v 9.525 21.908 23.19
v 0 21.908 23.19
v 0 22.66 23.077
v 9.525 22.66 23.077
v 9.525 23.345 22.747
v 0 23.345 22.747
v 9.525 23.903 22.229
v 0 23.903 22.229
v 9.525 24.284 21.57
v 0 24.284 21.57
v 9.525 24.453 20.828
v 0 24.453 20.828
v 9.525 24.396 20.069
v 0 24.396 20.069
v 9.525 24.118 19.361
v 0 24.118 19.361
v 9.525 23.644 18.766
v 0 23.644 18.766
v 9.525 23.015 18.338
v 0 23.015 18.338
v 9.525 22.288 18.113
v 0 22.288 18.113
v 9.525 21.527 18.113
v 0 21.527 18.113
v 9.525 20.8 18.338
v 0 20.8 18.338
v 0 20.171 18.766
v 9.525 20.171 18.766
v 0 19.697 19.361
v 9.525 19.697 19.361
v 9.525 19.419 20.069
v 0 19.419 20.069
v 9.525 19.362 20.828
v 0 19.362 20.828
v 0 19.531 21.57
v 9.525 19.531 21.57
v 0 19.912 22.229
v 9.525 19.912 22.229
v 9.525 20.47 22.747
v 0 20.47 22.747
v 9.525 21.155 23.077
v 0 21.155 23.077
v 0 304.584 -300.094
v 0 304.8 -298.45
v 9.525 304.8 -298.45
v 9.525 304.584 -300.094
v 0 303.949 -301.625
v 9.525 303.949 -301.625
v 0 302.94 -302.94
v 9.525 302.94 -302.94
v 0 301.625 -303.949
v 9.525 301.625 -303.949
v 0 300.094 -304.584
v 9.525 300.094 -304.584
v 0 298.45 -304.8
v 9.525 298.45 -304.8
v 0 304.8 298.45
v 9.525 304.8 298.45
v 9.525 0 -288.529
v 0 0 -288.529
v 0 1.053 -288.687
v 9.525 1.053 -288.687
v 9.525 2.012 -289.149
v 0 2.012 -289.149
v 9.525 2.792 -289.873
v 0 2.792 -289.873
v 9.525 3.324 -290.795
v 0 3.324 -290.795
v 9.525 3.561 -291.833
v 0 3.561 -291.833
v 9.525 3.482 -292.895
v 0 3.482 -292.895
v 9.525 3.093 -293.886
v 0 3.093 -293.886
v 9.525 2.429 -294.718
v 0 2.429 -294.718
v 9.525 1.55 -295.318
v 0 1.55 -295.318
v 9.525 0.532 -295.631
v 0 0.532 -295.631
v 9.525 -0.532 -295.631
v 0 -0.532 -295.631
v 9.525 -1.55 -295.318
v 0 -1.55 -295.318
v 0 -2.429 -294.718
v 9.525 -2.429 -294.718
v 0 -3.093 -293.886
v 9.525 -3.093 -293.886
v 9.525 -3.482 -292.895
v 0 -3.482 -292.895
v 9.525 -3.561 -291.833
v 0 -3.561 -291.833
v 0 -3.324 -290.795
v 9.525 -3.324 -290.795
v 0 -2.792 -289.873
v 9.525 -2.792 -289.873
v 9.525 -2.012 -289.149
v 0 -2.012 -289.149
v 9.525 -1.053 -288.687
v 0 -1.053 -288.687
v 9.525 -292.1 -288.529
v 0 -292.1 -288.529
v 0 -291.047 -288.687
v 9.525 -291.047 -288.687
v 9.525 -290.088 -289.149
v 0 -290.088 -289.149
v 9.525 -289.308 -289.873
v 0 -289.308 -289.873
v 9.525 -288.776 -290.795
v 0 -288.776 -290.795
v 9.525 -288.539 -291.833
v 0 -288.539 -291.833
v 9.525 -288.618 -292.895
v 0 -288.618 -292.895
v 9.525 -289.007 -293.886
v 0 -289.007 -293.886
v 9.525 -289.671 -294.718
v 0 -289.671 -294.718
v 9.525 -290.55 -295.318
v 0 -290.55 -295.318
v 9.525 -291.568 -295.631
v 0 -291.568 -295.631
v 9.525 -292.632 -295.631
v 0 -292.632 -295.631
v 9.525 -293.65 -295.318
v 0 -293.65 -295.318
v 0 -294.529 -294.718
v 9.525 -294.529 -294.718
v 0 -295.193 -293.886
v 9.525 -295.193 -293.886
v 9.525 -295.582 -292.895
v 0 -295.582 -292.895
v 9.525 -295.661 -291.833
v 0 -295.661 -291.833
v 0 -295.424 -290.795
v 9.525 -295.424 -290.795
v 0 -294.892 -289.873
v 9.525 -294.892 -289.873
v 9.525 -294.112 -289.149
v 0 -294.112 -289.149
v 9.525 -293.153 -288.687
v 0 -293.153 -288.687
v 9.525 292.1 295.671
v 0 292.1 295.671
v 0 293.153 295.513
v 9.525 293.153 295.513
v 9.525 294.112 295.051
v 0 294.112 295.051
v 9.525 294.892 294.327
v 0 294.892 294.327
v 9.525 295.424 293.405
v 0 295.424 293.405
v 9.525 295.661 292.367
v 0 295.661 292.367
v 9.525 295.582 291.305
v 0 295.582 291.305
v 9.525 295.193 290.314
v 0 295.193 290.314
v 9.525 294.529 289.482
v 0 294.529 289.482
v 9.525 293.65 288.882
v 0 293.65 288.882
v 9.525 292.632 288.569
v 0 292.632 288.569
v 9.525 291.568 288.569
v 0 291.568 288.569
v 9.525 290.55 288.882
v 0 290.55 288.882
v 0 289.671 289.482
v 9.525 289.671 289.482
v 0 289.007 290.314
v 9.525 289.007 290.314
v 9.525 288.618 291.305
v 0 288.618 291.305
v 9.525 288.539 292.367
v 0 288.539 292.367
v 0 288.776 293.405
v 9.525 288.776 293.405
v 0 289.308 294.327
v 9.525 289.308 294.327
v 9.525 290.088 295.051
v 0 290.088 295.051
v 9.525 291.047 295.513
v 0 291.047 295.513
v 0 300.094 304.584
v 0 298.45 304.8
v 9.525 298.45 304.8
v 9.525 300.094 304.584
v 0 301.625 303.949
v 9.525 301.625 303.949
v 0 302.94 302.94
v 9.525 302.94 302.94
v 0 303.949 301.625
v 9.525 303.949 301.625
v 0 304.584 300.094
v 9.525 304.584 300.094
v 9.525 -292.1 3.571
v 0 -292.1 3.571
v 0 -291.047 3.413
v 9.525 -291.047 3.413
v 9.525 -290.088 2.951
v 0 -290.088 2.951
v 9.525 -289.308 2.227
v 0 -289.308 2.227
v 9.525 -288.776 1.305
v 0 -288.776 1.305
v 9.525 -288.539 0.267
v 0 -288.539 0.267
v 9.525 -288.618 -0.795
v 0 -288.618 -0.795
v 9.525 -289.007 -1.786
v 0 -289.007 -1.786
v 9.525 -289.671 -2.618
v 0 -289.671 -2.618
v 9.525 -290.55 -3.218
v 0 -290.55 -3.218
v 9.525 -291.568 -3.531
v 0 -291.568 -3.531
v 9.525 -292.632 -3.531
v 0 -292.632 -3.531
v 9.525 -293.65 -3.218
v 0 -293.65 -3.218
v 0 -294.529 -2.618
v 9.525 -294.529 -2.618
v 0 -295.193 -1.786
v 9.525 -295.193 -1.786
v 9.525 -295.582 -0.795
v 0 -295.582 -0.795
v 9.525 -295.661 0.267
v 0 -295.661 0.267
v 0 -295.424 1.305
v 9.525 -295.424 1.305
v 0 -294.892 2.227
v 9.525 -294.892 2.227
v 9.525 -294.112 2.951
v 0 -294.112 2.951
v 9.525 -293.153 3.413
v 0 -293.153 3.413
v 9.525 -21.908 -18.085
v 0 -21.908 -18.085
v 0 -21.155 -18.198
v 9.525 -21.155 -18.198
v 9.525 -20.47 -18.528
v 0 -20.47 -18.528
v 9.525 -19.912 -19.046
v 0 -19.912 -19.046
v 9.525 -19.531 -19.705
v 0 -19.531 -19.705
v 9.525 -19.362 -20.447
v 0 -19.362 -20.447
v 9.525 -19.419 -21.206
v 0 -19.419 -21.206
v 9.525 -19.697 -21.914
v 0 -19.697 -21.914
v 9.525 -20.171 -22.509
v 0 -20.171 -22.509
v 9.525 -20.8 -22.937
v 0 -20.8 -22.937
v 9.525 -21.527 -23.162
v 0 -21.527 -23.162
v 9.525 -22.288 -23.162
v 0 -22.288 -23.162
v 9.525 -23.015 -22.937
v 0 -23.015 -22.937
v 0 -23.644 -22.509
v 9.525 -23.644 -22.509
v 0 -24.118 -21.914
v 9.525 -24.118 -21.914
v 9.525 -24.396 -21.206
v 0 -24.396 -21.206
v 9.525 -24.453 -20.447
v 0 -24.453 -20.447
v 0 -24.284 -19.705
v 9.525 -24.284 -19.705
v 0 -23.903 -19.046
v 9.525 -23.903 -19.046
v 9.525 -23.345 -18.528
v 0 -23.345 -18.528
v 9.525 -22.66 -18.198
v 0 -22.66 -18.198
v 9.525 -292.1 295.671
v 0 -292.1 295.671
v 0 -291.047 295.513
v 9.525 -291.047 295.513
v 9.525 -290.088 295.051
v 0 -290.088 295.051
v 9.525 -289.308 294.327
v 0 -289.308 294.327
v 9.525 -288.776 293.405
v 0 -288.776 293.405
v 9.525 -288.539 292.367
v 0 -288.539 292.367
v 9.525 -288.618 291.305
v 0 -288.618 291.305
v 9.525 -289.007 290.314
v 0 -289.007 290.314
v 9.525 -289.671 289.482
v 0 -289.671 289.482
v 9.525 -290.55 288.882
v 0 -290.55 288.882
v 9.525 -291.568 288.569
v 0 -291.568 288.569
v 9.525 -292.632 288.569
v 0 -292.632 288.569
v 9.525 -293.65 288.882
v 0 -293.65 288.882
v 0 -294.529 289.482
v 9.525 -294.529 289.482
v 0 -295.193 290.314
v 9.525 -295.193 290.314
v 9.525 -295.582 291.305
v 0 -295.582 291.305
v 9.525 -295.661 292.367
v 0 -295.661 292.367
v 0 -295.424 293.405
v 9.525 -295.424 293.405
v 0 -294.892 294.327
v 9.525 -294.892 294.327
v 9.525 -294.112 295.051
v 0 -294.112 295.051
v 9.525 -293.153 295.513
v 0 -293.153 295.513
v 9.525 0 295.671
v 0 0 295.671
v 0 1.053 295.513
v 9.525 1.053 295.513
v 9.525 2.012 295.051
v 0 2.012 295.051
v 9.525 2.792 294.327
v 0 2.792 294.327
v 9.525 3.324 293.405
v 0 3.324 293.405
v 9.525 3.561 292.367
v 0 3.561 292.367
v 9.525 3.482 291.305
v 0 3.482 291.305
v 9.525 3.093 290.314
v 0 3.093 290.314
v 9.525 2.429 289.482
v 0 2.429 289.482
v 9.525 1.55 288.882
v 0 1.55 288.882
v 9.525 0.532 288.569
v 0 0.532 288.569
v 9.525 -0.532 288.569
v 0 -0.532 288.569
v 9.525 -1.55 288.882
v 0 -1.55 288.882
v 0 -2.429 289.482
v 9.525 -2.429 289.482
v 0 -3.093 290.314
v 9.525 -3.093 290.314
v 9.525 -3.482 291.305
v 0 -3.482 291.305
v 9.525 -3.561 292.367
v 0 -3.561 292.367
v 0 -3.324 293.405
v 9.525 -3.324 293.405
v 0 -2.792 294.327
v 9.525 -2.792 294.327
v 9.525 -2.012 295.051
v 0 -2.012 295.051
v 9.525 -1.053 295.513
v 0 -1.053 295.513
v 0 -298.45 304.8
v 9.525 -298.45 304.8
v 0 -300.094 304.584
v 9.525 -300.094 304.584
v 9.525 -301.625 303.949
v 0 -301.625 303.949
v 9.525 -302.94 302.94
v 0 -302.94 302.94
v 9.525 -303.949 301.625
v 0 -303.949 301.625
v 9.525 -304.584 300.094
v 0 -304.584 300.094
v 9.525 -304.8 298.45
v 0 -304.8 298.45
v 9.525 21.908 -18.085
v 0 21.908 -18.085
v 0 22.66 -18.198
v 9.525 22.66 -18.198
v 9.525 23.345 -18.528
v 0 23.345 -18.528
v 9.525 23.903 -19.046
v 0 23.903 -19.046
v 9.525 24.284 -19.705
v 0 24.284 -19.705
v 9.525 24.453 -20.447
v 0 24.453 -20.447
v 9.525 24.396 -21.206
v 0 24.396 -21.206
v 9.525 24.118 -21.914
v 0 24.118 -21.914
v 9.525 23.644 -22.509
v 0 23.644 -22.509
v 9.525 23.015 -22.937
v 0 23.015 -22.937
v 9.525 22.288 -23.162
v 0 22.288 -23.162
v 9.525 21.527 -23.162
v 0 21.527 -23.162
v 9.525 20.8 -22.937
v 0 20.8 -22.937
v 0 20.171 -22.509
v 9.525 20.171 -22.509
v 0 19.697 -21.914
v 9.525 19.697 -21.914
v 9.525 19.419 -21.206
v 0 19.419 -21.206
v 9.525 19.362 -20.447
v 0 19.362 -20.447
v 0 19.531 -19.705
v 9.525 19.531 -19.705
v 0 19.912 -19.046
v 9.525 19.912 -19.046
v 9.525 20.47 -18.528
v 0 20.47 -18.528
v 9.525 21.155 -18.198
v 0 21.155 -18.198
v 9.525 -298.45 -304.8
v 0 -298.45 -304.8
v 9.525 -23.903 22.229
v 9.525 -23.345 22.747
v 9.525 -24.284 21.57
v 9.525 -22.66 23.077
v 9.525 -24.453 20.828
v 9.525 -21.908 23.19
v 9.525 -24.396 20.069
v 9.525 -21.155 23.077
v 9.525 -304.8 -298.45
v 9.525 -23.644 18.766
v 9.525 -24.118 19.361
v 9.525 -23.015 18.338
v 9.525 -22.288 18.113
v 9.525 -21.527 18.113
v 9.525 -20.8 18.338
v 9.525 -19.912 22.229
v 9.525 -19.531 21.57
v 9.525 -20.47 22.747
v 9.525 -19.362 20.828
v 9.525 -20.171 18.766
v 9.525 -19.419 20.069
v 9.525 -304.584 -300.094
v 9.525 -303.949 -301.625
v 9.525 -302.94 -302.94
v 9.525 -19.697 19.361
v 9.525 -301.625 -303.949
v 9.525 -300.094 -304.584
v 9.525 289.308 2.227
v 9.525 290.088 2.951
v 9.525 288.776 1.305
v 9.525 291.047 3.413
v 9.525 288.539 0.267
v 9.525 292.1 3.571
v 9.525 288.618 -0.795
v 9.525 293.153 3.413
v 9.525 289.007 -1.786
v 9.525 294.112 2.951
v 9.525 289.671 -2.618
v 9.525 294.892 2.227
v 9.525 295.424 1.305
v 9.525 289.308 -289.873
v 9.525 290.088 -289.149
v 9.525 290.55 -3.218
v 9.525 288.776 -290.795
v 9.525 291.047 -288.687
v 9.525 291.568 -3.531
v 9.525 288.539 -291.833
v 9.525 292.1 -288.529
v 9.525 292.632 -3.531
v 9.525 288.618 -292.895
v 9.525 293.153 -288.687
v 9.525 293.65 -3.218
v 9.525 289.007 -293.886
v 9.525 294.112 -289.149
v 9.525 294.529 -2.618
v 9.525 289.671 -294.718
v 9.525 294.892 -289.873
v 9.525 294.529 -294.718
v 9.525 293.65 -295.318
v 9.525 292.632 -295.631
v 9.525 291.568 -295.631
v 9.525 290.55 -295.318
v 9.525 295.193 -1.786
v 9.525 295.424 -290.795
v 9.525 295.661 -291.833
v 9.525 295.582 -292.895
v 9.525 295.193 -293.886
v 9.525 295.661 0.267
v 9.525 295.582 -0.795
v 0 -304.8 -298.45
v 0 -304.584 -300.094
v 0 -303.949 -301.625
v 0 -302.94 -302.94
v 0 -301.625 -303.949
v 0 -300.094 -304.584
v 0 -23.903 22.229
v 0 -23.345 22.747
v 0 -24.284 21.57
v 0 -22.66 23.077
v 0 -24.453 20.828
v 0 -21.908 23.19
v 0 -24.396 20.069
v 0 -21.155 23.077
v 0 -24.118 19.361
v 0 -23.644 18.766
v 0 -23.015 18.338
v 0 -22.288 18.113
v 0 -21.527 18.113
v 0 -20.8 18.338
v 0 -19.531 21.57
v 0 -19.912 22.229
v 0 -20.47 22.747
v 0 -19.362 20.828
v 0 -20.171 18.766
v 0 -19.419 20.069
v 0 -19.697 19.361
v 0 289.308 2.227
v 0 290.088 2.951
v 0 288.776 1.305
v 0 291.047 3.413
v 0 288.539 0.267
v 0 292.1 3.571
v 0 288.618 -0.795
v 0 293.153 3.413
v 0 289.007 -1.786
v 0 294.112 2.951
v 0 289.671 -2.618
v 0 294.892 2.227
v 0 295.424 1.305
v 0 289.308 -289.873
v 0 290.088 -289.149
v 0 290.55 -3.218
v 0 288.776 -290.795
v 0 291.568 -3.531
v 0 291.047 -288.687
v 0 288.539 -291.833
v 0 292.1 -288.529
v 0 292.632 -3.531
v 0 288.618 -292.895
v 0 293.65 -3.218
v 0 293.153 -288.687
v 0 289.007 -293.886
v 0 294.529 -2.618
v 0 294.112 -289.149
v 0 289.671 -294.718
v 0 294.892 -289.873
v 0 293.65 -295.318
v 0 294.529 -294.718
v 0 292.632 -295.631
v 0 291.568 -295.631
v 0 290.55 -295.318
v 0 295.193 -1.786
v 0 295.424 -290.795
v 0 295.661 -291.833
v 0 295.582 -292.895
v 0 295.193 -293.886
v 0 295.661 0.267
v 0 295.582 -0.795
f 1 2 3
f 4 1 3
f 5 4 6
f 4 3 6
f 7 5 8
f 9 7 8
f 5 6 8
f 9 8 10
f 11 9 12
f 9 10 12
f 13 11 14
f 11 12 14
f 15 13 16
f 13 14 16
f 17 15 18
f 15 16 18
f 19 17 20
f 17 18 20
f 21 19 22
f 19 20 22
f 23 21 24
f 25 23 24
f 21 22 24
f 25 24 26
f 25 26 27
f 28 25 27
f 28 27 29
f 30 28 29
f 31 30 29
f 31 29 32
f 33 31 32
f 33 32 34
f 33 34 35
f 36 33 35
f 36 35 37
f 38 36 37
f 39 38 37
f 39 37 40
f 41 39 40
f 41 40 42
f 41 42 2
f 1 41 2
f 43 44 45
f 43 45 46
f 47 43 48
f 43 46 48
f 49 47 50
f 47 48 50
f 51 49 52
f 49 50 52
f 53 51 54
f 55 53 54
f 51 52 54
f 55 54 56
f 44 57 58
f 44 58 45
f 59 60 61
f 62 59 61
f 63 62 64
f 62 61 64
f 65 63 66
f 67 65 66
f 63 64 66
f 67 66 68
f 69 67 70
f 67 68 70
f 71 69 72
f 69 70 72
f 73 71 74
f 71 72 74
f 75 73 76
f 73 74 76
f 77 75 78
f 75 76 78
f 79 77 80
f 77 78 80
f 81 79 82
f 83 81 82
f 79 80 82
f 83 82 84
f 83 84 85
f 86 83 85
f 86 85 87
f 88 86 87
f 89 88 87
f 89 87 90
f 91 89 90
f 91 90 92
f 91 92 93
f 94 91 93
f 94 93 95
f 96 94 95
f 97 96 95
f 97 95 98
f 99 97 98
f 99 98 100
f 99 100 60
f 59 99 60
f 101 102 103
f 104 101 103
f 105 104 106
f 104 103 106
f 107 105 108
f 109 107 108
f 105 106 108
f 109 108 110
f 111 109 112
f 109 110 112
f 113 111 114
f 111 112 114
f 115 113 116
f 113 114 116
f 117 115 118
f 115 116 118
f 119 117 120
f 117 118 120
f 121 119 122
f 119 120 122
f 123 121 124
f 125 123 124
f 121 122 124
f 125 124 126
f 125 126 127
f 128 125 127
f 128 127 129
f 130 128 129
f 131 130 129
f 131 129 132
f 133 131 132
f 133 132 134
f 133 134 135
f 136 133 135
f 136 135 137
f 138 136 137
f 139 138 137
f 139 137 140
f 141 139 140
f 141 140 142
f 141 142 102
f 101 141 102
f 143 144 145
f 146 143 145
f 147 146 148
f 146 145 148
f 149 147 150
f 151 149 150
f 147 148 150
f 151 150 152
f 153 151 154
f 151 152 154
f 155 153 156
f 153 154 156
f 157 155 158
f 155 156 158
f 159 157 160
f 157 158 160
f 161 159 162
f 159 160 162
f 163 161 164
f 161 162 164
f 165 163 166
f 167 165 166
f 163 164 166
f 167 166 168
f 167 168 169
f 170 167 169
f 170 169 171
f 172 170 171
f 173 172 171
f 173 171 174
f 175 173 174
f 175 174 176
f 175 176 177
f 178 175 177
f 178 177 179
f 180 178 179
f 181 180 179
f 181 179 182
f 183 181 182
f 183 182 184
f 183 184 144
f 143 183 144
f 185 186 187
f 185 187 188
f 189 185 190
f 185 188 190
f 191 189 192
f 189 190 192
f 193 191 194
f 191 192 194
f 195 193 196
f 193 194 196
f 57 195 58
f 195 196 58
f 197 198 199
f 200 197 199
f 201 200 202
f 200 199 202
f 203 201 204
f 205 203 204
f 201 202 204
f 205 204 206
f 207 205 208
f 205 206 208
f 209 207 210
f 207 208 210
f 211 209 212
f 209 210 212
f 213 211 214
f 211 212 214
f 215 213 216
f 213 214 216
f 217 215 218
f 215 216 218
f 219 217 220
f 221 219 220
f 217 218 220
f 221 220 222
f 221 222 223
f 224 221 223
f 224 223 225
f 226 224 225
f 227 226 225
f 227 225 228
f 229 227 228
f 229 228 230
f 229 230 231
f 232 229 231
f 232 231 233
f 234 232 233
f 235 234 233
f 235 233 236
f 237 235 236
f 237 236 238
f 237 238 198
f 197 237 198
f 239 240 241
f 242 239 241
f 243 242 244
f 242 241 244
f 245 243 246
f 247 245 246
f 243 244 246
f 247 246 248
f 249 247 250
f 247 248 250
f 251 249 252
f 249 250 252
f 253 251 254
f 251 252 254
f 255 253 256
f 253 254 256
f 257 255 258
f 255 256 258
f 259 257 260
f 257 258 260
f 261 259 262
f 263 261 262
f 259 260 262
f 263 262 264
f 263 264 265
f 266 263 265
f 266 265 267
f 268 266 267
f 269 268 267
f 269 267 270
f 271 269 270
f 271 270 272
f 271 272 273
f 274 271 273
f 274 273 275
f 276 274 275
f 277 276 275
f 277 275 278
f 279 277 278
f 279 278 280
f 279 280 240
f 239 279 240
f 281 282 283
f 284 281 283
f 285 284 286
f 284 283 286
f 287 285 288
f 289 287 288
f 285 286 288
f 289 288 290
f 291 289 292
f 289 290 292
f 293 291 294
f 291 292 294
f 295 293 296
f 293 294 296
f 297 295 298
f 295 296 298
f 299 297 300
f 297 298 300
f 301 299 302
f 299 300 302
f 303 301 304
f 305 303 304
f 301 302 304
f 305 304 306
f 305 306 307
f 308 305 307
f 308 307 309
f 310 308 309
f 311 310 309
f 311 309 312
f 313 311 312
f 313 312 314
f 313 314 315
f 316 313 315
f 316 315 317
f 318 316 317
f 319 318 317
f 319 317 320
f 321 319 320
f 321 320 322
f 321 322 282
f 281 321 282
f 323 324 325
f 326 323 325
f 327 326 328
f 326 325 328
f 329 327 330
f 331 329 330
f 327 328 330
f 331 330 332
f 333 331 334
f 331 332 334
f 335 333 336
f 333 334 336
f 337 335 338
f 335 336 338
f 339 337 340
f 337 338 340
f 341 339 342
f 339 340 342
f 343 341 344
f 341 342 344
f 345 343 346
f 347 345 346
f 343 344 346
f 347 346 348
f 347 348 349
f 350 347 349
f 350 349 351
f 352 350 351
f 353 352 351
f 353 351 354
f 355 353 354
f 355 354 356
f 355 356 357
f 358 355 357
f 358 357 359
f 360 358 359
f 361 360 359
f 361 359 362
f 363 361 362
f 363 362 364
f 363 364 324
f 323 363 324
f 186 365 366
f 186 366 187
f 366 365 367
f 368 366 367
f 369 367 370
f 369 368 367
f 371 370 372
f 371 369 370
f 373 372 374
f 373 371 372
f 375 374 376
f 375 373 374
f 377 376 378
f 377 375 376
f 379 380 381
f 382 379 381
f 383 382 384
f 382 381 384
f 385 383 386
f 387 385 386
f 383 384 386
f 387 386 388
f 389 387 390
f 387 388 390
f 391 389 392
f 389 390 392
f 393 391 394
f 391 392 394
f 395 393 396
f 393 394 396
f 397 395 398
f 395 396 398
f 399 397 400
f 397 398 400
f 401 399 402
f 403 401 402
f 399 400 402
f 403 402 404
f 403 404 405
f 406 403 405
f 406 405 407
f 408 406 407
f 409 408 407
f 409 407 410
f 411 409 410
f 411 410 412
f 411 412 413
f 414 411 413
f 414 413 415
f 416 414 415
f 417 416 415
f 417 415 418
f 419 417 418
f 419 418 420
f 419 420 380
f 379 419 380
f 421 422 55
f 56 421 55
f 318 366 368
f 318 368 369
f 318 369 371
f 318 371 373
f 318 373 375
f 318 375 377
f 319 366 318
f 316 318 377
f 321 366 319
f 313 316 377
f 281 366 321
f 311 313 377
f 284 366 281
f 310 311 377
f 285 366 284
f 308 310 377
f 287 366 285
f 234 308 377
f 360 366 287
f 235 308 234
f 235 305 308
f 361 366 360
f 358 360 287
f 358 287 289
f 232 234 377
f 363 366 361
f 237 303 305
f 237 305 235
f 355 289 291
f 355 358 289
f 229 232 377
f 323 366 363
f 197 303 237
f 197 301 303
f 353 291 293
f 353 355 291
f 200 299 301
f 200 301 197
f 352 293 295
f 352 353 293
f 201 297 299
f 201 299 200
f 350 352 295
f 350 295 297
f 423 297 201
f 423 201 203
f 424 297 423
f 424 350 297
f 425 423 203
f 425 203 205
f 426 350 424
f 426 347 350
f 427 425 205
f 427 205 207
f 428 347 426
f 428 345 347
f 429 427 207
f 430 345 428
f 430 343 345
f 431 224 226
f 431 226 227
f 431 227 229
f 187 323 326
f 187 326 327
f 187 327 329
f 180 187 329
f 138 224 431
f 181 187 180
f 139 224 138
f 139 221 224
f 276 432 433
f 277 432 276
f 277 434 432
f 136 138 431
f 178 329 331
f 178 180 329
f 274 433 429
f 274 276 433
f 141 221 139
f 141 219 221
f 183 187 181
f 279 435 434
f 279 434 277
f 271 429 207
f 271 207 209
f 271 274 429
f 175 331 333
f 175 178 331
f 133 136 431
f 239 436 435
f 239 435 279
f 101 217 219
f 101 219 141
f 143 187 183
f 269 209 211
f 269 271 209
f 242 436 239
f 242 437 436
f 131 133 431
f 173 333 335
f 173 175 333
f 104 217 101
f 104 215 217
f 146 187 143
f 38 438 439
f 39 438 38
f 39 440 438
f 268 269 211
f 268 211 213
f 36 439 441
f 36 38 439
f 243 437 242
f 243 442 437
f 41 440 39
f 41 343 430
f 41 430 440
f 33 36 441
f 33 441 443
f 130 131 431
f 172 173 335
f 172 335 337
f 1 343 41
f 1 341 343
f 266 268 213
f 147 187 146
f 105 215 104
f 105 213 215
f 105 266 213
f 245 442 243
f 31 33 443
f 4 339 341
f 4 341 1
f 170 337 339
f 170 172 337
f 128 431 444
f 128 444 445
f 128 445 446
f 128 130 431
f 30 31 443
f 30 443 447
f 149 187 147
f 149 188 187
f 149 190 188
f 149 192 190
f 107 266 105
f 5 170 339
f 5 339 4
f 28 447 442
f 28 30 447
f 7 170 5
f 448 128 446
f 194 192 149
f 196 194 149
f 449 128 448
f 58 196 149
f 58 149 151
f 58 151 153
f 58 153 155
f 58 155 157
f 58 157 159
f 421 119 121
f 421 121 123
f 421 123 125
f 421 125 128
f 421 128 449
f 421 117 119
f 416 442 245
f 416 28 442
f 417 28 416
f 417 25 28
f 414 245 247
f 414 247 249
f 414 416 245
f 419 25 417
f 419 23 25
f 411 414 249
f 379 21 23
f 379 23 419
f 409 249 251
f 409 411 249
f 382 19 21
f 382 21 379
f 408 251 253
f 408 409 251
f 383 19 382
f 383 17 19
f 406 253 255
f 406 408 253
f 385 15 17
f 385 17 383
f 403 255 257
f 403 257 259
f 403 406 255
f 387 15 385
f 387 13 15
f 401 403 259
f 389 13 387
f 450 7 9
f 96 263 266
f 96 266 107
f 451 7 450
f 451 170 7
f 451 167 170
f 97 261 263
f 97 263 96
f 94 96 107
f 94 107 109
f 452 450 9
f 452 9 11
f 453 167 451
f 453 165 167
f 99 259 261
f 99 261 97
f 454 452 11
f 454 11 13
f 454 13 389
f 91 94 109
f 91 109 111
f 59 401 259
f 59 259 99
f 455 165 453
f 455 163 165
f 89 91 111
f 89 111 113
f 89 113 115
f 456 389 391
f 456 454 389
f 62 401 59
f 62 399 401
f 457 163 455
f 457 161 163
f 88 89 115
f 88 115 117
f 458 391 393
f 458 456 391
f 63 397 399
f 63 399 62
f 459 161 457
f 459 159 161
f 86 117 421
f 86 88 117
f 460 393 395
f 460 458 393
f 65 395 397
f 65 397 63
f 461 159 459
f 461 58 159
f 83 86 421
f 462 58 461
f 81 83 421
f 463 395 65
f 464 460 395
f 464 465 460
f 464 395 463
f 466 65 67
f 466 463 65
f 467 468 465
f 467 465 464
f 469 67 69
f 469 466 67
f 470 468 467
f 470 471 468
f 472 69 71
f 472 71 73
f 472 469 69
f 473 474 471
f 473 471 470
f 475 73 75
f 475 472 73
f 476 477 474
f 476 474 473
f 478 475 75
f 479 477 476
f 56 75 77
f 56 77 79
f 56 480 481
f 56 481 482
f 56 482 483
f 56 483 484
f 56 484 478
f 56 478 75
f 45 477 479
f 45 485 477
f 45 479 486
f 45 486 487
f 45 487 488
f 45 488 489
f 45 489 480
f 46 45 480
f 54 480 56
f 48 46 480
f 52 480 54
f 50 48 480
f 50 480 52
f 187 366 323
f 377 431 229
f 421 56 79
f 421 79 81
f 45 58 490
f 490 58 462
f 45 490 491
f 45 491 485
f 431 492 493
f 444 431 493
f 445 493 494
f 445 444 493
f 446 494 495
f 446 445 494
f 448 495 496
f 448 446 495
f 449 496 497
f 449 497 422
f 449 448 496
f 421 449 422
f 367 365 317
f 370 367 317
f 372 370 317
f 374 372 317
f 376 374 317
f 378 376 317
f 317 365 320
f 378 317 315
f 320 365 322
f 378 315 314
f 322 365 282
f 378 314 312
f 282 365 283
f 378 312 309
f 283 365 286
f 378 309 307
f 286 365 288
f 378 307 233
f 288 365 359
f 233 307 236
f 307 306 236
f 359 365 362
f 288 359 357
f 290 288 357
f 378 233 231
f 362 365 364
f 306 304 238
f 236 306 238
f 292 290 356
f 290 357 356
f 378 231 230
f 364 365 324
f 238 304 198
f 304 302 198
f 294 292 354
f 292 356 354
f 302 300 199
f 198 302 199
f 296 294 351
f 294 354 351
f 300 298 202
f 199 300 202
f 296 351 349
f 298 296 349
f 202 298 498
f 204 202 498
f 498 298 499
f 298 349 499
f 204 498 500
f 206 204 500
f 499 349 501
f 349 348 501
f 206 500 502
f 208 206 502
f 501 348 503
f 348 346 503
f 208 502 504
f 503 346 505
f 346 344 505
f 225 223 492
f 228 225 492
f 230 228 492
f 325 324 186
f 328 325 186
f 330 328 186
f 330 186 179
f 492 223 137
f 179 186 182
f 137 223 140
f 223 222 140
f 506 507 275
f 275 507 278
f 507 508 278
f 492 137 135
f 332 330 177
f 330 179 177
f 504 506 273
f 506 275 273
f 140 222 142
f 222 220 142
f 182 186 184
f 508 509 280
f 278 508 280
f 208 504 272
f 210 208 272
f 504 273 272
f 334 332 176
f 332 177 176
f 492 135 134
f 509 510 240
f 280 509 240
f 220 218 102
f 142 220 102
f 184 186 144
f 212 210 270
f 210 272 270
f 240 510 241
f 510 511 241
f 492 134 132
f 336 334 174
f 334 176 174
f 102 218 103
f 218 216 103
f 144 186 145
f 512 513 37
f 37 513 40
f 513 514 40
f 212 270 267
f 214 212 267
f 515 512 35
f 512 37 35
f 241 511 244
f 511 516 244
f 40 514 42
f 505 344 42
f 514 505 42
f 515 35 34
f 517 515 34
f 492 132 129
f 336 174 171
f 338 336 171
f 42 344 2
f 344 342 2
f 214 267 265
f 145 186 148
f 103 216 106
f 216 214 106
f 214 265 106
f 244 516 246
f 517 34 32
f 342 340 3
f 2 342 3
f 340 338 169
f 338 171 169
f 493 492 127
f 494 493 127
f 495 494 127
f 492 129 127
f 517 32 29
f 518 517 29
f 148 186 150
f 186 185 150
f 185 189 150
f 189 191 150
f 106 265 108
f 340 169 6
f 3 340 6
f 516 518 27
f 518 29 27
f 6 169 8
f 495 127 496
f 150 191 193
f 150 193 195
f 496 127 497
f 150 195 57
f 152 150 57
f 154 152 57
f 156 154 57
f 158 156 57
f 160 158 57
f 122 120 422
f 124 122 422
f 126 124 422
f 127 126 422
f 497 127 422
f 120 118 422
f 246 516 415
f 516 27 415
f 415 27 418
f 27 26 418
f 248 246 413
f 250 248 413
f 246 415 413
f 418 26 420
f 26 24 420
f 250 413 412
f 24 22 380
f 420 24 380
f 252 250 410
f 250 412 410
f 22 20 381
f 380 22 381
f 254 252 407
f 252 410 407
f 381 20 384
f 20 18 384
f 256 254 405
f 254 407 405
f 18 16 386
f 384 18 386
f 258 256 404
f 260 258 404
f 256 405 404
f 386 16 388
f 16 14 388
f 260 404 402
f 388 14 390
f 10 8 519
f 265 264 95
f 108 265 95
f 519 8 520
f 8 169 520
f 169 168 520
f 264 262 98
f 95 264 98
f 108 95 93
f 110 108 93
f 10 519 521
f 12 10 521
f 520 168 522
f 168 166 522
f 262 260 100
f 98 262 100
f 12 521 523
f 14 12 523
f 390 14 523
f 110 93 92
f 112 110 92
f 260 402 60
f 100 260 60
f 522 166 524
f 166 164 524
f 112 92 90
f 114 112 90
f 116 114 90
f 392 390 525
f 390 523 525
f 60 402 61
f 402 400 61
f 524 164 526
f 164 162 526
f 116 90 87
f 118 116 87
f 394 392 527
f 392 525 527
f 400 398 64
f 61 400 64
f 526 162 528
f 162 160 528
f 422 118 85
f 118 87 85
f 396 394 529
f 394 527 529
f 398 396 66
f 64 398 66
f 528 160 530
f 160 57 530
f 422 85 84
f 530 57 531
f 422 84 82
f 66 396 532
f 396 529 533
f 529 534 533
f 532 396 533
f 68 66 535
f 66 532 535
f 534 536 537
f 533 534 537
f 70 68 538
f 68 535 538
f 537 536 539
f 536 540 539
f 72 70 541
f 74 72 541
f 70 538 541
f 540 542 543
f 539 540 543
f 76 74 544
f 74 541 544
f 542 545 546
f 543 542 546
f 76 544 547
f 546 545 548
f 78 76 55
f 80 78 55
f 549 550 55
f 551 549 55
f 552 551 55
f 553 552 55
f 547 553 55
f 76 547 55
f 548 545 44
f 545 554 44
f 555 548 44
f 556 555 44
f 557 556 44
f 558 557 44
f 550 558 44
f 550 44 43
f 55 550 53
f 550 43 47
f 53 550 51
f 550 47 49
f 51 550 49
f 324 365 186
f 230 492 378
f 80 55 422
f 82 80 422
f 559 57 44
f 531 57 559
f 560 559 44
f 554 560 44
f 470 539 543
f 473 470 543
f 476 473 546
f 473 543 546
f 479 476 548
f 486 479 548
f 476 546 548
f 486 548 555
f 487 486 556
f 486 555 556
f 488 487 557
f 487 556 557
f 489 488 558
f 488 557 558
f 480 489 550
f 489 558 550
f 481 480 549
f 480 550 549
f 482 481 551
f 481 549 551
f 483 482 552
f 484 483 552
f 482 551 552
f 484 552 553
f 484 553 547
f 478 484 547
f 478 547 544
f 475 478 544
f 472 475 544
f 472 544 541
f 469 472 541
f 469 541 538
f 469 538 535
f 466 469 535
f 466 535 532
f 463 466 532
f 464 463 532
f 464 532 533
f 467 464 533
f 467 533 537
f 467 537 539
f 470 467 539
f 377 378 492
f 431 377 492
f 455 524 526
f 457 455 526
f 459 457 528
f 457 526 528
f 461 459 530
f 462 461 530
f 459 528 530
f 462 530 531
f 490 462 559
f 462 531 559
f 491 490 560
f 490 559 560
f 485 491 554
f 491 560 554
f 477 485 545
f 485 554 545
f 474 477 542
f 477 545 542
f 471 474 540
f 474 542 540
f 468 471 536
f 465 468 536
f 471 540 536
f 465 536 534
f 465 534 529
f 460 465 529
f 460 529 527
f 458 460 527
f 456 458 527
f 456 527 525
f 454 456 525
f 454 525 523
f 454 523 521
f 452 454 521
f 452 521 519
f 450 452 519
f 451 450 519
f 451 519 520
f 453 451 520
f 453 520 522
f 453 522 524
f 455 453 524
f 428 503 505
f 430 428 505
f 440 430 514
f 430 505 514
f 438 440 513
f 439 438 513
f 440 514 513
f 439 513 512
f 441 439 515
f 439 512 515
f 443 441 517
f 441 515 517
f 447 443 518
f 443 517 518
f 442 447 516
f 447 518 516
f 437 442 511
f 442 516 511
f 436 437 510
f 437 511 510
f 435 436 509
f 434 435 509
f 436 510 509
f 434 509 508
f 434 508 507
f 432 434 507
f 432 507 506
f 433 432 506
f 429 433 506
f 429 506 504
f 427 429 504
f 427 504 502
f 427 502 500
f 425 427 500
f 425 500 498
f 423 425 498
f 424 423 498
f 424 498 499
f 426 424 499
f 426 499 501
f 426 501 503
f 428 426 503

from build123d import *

# Parameters (mm, degrees)
SKETCH1_W               = 609.6
SKETCH1_H               = 609.6
BOSS_EXTRUDE1_DEPTH     = 9.525
F_1_4_20_TAPPED_HOLE1_D = 5.1054
FILLET1_R               = 6.35
F_1_4_CLEARANCE_HOLE1_D = 7.14248


with BuildPart() as part:
    # Sketch1 → Boss-Extrude1 (new body)
    with BuildSketch(Plane(origin=(0, 0, 0), x_dir=(0, 0, -1), z_dir=(1, 0, 0))):
        Rectangle(SKETCH1_W, SKETCH1_H)
    extrude(amount=BOSS_EXTRUDE1_DEPTH)

    # 1/4-20 Tapped Hole1 (through all)
    with Locations(Plane(origin=(9.525, 0, 0), x_dir=(0, 0, -1), z_dir=(1, 0, 0))):
        with Locations((-20.6375, 21.9075), (20.6375, 21.9075), (20.6375, -21.9075), (-20.6375, -21.9075)):
            Hole(F_1_4_20_TAPPED_HOLE1_D / 2)

    # Fillet1
    fillet1_edges = [part.edges().sort_by_distance(p)[0] for p in [
        (4.7625, -304.8, -304.8),
        (4.7625, -304.8, 304.8),
        (4.7625, 304.8, 304.8),
        (4.7625, 304.8, -304.8),
    ]]
    fillet(fillet1_edges, radius=FILLET1_R)

    # 1/4 Clearance Hole1 (through all)
    with Locations(Plane(origin=(9.525, 0, 0), x_dir=(0, 0, -1), z_dir=(1, 0, 0))):
        with Locations((-292.1, 292.1), (292.1, 292.1), (292.1, -292.1), (-292.1, -292.1), (0, 292.1), (-292.1, 0), (0, -292.1), (292.1, 0)):
            Hole(F_1_4_CLEARANCE_HOLE1_D / 2)


solid = part.part
